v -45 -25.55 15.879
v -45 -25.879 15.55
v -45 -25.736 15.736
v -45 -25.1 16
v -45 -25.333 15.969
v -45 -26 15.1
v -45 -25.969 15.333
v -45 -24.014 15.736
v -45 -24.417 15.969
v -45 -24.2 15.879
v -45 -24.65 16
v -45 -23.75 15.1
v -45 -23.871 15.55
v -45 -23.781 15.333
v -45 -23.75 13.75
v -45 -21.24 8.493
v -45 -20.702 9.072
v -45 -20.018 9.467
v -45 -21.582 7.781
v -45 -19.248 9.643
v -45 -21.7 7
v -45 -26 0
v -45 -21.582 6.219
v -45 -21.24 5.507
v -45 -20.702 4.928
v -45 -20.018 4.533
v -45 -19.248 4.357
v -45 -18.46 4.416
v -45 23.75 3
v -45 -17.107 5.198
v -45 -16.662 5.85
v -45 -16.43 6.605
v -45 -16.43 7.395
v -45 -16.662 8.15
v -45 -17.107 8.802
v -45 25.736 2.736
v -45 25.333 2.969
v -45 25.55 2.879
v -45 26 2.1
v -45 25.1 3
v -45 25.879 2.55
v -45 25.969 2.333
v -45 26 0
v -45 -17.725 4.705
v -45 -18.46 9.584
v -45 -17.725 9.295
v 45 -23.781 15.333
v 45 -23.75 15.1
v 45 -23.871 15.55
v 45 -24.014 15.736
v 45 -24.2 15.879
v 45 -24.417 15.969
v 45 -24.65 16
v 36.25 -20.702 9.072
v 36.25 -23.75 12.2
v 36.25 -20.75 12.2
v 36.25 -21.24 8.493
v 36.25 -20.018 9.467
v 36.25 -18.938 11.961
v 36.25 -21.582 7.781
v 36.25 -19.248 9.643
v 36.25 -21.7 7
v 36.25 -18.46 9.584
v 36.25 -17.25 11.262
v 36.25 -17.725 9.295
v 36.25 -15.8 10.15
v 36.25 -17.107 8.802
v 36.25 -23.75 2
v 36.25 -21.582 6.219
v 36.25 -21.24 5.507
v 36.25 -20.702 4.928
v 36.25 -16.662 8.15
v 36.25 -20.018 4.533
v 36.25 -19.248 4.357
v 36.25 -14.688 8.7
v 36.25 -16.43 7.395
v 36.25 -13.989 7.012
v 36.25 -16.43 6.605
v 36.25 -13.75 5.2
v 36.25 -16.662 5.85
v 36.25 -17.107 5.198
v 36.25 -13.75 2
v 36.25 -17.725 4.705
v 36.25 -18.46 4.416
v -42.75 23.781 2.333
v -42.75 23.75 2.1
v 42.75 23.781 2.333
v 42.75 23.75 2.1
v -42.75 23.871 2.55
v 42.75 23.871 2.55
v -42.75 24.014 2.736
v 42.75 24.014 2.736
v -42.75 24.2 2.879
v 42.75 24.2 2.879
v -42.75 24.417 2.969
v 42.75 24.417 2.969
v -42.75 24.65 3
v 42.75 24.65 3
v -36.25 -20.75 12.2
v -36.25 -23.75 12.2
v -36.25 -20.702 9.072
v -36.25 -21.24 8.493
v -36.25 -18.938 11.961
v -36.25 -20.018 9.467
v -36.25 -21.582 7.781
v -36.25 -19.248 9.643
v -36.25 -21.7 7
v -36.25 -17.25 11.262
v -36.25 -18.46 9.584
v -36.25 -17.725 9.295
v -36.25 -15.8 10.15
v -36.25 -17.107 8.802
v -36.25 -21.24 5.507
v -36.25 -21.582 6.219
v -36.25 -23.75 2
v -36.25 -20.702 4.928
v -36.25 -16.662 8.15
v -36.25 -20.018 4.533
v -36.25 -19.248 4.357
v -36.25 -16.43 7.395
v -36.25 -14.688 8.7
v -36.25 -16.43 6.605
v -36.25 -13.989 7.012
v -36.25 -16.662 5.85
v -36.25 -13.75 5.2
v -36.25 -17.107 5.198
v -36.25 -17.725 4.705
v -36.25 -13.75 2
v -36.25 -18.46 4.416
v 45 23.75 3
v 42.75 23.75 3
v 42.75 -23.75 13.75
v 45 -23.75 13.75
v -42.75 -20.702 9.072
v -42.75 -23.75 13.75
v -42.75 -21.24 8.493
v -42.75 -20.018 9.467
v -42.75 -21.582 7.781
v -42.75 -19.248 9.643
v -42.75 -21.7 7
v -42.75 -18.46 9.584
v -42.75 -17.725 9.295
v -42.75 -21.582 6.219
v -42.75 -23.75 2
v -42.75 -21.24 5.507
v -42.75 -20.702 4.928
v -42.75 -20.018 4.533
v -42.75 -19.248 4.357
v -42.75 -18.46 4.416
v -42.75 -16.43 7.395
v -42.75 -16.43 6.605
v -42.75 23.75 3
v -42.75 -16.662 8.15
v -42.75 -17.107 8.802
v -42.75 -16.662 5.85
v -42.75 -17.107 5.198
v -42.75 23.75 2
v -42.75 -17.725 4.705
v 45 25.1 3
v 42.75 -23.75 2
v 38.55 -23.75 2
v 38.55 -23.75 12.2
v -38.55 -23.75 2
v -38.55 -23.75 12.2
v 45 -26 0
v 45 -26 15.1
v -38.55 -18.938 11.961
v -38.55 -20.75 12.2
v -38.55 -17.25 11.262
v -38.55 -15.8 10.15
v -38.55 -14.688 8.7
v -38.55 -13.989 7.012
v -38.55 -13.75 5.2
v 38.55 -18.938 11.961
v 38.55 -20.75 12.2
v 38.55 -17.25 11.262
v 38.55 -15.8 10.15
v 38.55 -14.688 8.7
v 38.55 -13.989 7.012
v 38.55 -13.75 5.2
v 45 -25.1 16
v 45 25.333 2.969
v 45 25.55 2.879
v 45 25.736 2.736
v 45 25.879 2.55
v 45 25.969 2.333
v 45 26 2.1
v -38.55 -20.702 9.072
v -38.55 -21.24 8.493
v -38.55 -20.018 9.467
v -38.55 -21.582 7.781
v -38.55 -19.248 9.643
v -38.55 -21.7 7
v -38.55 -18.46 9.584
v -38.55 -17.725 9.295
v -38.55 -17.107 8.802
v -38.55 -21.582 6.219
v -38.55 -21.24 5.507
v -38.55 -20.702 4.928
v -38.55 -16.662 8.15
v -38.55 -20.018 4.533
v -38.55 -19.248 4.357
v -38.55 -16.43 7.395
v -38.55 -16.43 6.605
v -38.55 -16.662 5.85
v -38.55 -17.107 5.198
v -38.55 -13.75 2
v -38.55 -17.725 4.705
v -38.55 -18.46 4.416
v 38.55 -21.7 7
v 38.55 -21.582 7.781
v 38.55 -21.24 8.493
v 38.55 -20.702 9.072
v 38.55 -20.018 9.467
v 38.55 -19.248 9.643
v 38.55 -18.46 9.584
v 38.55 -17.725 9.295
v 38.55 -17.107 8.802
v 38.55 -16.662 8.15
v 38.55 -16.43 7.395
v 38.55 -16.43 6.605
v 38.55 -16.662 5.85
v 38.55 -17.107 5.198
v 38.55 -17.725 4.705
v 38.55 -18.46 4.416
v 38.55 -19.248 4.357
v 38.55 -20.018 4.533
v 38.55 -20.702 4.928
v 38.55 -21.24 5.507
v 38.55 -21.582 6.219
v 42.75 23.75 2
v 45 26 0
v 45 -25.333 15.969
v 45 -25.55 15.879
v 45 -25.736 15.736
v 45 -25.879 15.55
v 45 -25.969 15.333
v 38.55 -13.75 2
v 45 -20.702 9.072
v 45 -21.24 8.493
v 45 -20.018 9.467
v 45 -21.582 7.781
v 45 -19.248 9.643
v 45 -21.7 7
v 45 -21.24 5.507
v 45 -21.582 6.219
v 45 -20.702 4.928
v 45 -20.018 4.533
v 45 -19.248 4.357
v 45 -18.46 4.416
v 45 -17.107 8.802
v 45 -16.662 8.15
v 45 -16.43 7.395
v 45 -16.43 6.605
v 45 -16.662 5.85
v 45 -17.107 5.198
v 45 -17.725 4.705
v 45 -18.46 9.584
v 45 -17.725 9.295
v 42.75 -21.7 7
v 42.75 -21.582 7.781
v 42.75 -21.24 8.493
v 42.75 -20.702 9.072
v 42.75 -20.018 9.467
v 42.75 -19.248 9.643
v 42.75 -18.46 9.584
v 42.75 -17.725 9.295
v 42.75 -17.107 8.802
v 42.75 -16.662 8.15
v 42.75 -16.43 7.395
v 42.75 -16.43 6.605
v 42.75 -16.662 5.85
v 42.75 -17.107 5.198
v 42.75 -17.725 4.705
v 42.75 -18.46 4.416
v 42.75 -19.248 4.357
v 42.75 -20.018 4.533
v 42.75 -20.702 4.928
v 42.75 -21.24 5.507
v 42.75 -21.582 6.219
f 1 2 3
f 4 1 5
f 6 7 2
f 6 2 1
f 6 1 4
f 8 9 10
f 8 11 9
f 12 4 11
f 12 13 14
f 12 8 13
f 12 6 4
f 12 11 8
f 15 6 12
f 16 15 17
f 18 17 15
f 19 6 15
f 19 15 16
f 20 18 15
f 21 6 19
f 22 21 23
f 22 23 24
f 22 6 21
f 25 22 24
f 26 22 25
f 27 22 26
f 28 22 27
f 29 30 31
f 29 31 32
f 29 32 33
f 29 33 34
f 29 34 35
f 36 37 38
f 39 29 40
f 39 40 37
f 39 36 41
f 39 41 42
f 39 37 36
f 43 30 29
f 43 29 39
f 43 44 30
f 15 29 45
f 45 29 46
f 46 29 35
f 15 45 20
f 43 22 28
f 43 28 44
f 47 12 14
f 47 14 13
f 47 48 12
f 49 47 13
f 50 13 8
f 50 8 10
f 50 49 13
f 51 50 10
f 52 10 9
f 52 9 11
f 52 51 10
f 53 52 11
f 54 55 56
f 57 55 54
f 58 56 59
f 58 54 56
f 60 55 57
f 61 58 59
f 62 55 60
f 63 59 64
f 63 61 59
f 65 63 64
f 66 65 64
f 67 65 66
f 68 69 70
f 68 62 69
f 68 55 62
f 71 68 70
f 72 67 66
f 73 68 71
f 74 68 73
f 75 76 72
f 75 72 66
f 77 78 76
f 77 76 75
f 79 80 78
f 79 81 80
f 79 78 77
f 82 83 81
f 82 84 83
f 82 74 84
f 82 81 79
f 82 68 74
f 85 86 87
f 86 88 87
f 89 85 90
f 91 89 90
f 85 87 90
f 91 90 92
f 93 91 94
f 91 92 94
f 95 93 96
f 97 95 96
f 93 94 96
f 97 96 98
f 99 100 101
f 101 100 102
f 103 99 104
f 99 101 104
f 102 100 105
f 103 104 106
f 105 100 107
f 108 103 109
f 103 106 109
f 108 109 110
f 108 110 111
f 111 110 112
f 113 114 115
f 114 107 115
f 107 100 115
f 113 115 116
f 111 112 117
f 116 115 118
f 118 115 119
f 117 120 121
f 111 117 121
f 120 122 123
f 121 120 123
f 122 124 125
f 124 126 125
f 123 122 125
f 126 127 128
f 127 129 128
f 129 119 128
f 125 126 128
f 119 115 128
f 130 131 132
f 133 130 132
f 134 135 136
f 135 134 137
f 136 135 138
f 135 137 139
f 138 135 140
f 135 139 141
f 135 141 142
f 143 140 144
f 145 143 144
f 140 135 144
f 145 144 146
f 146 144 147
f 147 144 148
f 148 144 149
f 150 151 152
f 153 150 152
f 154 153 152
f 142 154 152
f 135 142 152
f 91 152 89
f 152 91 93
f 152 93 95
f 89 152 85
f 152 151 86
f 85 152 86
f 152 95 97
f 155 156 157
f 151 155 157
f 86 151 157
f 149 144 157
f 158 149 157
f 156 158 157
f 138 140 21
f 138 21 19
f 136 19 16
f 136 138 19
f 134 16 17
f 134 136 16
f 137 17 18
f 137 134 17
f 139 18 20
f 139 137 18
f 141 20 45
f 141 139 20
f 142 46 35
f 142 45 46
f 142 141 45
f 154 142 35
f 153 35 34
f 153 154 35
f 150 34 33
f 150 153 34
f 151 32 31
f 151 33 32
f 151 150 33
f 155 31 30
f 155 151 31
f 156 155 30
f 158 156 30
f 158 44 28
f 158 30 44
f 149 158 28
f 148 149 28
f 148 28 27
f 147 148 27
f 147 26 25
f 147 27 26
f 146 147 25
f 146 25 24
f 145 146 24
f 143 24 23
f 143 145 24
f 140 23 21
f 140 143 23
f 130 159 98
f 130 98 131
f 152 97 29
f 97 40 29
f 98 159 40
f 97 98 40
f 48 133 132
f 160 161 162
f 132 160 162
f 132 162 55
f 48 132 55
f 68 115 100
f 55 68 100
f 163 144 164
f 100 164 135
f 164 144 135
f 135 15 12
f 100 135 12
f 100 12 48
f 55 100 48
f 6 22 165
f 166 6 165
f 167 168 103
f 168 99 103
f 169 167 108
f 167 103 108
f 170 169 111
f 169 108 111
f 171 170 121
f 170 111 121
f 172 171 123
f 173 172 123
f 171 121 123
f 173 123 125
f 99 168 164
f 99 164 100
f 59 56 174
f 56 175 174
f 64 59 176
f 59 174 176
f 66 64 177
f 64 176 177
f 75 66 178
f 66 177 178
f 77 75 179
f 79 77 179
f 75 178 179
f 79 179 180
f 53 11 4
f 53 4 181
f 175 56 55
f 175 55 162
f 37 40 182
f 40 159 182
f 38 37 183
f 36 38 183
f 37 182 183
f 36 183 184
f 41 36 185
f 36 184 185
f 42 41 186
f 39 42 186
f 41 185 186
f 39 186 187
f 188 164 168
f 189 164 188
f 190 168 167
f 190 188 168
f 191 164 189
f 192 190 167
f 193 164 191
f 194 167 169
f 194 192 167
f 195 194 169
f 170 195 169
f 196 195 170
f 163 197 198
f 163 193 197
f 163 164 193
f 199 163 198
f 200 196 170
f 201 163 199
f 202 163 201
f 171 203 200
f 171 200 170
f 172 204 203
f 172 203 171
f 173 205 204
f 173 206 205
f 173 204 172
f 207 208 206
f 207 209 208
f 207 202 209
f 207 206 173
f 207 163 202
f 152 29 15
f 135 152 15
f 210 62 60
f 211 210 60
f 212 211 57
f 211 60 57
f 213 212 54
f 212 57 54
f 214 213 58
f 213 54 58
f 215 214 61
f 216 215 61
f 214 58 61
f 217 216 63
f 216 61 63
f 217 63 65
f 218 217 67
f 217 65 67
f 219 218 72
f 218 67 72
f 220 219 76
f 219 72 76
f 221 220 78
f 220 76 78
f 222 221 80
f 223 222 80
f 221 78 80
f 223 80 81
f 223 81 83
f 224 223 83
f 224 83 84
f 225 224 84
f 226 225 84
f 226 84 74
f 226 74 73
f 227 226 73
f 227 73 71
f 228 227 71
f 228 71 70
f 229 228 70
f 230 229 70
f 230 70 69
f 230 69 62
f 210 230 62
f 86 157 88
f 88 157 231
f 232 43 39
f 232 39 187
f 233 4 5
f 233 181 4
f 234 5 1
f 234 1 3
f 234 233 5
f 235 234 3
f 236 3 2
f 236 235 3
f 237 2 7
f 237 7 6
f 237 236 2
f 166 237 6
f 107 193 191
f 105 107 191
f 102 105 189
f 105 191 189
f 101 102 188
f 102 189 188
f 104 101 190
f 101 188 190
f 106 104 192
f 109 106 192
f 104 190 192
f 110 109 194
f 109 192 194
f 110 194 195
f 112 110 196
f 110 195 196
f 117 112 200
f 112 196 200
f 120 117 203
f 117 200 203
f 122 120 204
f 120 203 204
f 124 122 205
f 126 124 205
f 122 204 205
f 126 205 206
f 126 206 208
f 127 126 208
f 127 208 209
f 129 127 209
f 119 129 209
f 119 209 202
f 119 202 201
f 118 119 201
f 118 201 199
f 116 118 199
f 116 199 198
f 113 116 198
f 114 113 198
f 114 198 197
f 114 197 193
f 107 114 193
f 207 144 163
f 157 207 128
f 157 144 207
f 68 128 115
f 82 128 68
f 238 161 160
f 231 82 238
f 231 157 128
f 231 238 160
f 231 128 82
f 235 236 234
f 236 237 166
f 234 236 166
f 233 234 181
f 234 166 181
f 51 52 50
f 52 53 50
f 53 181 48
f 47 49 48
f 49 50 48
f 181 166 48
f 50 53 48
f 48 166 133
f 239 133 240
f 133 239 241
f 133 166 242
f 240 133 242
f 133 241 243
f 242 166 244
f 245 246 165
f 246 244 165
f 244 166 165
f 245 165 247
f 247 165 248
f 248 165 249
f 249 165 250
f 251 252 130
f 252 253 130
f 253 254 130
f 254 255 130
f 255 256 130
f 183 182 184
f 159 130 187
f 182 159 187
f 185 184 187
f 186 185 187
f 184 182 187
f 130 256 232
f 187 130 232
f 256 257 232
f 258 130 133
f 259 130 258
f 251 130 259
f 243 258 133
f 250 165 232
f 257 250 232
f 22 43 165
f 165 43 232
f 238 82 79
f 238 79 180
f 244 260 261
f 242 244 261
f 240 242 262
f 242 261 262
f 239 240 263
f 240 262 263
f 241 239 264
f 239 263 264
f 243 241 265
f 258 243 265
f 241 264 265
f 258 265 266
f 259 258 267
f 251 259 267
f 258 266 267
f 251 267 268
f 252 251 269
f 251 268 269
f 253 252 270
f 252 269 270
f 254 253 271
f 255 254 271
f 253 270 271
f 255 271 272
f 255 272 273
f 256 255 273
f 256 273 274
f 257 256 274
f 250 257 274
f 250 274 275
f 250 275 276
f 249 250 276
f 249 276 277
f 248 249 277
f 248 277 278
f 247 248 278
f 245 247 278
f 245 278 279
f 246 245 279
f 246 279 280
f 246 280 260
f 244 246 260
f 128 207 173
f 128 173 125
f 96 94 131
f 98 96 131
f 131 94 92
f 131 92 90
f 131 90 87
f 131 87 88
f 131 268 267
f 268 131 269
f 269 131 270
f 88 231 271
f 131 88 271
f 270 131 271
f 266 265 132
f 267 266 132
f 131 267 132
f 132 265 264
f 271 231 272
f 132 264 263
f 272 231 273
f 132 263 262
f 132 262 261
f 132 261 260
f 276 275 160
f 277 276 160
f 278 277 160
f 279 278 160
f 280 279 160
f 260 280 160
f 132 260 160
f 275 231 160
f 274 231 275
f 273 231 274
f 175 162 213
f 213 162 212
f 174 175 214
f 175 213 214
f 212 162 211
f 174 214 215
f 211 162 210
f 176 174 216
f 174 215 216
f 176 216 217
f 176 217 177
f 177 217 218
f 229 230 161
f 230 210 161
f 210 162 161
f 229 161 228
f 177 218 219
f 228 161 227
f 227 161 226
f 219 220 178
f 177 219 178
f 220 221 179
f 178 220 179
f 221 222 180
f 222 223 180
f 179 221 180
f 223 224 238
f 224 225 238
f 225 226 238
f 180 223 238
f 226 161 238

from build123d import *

# Parameters (mm, degrees)
F0_W          = 90
F0_H          = 52
F1_DEPTH      = 16
F3_DEPTH      = 1323
F0_W_2        = 2.3
F0_H_2        = 10
F4_DEPTH      = 12.2
F5_R          = 2.65
F6_DEPTH      = 100
F6_DEPTH_BACK = 25
F7_DEPTH      = 2
F8_R          = 7
F9_R          = 0.9


with BuildPart() as f1:
    # F0 (on Top) → F1 (new body)
    with BuildSketch(Plane.XY):
        Rectangle(F0_W, F0_H)
        Polygon((-42.75, 23.75), (42.75, 23.75), (42.75, -23.75), (38.55, -23.75), (36.25, -23.75), (-36.25, -23.75), (-38.55, -23.75), (-42.75, -23.75), align=None, mode=Mode.SUBTRACT)
    extrude(amount=F1_DEPTH)

    # F2 (on face) → F3 (cut)
    with BuildSketch(Plane(origin=(-45, 0, 0), x_dir=(0, -1, 0), z_dir=(-1, 0, 0))):
        Polygon((-26, 16), (-26, 3), (-23.75, 3), (23.75, 13.75), (23.75, 16), align=None)
    extrude(amount=-F3_DEPTH, mode=Mode.SUBTRACT)

    # F0 (on Top) → F4 (join)
    with BuildSketch(Plane.XY):
        with Locations((-37.4, -18.75)):
            Rectangle(F0_W_2, F0_H_2)
        with Locations((37.4, -18.75)):
            Rectangle(F0_W_2, F0_H_2)
    extrude(amount=F4_DEPTH)

    # F5 (on face) → F6 (cut, two sides)
    with BuildSketch(Plane(origin=(-38.55, 0, 0), x_dir=(0, -1, 0), z_dir=(-1, 0, 0))) as f6_sk:
        with Locations((19.05, 7)):
            Circle(F5_R)
    extrude(amount=-F6_DEPTH, mode=Mode.SUBTRACT)
    extrude(f6_sk.sketch, amount=F6_DEPTH_BACK, mode=Mode.SUBTRACT)

    # F0 (on Top) → F7 (join)
    with BuildSketch(Plane.XY):
        Rectangle(F0_W, F0_H)
        Polygon((-42.75, 23.75), (42.75, 23.75), (42.75, -23.75), (38.55, -23.75), (36.25, -23.75), (-36.25, -23.75), (-38.55, -23.75), (-42.75, -23.75), align=None, mode=Mode.SUBTRACT)
        Polygon((42.75, -23.75), (42.75, 23.75), (-42.75, 23.75), (-42.75, -23.75), (-38.55, -23.75), (-38.55, -13.75), (-36.25, -13.75), (-36.25, -23.75), (36.25, -23.75), (36.25, -13.75), (38.55, -13.75), (38.55, -23.75), align=None)
    extrude(amount=F7_DEPTH)

    # F8
    f8_edges = [f1.edges().sort_by_distance(p)[0] for p in [
        (-37.4, -13.75, 12.2),
        (37.4, -13.75, 12.2),
    ]]
    fillet(f8_edges, radius=F8_R)

    # F9
    f9_edges = [f1.edges().sort_by_distance(p)[0] for p in [
        (0, -26, 16),
        (0, -23.75, 16),
        (0, 23.75, 3),
        (0, 26, 3),
    ]]
    fillet(f9_edges, radius=F9_R)


solid = f1.part
